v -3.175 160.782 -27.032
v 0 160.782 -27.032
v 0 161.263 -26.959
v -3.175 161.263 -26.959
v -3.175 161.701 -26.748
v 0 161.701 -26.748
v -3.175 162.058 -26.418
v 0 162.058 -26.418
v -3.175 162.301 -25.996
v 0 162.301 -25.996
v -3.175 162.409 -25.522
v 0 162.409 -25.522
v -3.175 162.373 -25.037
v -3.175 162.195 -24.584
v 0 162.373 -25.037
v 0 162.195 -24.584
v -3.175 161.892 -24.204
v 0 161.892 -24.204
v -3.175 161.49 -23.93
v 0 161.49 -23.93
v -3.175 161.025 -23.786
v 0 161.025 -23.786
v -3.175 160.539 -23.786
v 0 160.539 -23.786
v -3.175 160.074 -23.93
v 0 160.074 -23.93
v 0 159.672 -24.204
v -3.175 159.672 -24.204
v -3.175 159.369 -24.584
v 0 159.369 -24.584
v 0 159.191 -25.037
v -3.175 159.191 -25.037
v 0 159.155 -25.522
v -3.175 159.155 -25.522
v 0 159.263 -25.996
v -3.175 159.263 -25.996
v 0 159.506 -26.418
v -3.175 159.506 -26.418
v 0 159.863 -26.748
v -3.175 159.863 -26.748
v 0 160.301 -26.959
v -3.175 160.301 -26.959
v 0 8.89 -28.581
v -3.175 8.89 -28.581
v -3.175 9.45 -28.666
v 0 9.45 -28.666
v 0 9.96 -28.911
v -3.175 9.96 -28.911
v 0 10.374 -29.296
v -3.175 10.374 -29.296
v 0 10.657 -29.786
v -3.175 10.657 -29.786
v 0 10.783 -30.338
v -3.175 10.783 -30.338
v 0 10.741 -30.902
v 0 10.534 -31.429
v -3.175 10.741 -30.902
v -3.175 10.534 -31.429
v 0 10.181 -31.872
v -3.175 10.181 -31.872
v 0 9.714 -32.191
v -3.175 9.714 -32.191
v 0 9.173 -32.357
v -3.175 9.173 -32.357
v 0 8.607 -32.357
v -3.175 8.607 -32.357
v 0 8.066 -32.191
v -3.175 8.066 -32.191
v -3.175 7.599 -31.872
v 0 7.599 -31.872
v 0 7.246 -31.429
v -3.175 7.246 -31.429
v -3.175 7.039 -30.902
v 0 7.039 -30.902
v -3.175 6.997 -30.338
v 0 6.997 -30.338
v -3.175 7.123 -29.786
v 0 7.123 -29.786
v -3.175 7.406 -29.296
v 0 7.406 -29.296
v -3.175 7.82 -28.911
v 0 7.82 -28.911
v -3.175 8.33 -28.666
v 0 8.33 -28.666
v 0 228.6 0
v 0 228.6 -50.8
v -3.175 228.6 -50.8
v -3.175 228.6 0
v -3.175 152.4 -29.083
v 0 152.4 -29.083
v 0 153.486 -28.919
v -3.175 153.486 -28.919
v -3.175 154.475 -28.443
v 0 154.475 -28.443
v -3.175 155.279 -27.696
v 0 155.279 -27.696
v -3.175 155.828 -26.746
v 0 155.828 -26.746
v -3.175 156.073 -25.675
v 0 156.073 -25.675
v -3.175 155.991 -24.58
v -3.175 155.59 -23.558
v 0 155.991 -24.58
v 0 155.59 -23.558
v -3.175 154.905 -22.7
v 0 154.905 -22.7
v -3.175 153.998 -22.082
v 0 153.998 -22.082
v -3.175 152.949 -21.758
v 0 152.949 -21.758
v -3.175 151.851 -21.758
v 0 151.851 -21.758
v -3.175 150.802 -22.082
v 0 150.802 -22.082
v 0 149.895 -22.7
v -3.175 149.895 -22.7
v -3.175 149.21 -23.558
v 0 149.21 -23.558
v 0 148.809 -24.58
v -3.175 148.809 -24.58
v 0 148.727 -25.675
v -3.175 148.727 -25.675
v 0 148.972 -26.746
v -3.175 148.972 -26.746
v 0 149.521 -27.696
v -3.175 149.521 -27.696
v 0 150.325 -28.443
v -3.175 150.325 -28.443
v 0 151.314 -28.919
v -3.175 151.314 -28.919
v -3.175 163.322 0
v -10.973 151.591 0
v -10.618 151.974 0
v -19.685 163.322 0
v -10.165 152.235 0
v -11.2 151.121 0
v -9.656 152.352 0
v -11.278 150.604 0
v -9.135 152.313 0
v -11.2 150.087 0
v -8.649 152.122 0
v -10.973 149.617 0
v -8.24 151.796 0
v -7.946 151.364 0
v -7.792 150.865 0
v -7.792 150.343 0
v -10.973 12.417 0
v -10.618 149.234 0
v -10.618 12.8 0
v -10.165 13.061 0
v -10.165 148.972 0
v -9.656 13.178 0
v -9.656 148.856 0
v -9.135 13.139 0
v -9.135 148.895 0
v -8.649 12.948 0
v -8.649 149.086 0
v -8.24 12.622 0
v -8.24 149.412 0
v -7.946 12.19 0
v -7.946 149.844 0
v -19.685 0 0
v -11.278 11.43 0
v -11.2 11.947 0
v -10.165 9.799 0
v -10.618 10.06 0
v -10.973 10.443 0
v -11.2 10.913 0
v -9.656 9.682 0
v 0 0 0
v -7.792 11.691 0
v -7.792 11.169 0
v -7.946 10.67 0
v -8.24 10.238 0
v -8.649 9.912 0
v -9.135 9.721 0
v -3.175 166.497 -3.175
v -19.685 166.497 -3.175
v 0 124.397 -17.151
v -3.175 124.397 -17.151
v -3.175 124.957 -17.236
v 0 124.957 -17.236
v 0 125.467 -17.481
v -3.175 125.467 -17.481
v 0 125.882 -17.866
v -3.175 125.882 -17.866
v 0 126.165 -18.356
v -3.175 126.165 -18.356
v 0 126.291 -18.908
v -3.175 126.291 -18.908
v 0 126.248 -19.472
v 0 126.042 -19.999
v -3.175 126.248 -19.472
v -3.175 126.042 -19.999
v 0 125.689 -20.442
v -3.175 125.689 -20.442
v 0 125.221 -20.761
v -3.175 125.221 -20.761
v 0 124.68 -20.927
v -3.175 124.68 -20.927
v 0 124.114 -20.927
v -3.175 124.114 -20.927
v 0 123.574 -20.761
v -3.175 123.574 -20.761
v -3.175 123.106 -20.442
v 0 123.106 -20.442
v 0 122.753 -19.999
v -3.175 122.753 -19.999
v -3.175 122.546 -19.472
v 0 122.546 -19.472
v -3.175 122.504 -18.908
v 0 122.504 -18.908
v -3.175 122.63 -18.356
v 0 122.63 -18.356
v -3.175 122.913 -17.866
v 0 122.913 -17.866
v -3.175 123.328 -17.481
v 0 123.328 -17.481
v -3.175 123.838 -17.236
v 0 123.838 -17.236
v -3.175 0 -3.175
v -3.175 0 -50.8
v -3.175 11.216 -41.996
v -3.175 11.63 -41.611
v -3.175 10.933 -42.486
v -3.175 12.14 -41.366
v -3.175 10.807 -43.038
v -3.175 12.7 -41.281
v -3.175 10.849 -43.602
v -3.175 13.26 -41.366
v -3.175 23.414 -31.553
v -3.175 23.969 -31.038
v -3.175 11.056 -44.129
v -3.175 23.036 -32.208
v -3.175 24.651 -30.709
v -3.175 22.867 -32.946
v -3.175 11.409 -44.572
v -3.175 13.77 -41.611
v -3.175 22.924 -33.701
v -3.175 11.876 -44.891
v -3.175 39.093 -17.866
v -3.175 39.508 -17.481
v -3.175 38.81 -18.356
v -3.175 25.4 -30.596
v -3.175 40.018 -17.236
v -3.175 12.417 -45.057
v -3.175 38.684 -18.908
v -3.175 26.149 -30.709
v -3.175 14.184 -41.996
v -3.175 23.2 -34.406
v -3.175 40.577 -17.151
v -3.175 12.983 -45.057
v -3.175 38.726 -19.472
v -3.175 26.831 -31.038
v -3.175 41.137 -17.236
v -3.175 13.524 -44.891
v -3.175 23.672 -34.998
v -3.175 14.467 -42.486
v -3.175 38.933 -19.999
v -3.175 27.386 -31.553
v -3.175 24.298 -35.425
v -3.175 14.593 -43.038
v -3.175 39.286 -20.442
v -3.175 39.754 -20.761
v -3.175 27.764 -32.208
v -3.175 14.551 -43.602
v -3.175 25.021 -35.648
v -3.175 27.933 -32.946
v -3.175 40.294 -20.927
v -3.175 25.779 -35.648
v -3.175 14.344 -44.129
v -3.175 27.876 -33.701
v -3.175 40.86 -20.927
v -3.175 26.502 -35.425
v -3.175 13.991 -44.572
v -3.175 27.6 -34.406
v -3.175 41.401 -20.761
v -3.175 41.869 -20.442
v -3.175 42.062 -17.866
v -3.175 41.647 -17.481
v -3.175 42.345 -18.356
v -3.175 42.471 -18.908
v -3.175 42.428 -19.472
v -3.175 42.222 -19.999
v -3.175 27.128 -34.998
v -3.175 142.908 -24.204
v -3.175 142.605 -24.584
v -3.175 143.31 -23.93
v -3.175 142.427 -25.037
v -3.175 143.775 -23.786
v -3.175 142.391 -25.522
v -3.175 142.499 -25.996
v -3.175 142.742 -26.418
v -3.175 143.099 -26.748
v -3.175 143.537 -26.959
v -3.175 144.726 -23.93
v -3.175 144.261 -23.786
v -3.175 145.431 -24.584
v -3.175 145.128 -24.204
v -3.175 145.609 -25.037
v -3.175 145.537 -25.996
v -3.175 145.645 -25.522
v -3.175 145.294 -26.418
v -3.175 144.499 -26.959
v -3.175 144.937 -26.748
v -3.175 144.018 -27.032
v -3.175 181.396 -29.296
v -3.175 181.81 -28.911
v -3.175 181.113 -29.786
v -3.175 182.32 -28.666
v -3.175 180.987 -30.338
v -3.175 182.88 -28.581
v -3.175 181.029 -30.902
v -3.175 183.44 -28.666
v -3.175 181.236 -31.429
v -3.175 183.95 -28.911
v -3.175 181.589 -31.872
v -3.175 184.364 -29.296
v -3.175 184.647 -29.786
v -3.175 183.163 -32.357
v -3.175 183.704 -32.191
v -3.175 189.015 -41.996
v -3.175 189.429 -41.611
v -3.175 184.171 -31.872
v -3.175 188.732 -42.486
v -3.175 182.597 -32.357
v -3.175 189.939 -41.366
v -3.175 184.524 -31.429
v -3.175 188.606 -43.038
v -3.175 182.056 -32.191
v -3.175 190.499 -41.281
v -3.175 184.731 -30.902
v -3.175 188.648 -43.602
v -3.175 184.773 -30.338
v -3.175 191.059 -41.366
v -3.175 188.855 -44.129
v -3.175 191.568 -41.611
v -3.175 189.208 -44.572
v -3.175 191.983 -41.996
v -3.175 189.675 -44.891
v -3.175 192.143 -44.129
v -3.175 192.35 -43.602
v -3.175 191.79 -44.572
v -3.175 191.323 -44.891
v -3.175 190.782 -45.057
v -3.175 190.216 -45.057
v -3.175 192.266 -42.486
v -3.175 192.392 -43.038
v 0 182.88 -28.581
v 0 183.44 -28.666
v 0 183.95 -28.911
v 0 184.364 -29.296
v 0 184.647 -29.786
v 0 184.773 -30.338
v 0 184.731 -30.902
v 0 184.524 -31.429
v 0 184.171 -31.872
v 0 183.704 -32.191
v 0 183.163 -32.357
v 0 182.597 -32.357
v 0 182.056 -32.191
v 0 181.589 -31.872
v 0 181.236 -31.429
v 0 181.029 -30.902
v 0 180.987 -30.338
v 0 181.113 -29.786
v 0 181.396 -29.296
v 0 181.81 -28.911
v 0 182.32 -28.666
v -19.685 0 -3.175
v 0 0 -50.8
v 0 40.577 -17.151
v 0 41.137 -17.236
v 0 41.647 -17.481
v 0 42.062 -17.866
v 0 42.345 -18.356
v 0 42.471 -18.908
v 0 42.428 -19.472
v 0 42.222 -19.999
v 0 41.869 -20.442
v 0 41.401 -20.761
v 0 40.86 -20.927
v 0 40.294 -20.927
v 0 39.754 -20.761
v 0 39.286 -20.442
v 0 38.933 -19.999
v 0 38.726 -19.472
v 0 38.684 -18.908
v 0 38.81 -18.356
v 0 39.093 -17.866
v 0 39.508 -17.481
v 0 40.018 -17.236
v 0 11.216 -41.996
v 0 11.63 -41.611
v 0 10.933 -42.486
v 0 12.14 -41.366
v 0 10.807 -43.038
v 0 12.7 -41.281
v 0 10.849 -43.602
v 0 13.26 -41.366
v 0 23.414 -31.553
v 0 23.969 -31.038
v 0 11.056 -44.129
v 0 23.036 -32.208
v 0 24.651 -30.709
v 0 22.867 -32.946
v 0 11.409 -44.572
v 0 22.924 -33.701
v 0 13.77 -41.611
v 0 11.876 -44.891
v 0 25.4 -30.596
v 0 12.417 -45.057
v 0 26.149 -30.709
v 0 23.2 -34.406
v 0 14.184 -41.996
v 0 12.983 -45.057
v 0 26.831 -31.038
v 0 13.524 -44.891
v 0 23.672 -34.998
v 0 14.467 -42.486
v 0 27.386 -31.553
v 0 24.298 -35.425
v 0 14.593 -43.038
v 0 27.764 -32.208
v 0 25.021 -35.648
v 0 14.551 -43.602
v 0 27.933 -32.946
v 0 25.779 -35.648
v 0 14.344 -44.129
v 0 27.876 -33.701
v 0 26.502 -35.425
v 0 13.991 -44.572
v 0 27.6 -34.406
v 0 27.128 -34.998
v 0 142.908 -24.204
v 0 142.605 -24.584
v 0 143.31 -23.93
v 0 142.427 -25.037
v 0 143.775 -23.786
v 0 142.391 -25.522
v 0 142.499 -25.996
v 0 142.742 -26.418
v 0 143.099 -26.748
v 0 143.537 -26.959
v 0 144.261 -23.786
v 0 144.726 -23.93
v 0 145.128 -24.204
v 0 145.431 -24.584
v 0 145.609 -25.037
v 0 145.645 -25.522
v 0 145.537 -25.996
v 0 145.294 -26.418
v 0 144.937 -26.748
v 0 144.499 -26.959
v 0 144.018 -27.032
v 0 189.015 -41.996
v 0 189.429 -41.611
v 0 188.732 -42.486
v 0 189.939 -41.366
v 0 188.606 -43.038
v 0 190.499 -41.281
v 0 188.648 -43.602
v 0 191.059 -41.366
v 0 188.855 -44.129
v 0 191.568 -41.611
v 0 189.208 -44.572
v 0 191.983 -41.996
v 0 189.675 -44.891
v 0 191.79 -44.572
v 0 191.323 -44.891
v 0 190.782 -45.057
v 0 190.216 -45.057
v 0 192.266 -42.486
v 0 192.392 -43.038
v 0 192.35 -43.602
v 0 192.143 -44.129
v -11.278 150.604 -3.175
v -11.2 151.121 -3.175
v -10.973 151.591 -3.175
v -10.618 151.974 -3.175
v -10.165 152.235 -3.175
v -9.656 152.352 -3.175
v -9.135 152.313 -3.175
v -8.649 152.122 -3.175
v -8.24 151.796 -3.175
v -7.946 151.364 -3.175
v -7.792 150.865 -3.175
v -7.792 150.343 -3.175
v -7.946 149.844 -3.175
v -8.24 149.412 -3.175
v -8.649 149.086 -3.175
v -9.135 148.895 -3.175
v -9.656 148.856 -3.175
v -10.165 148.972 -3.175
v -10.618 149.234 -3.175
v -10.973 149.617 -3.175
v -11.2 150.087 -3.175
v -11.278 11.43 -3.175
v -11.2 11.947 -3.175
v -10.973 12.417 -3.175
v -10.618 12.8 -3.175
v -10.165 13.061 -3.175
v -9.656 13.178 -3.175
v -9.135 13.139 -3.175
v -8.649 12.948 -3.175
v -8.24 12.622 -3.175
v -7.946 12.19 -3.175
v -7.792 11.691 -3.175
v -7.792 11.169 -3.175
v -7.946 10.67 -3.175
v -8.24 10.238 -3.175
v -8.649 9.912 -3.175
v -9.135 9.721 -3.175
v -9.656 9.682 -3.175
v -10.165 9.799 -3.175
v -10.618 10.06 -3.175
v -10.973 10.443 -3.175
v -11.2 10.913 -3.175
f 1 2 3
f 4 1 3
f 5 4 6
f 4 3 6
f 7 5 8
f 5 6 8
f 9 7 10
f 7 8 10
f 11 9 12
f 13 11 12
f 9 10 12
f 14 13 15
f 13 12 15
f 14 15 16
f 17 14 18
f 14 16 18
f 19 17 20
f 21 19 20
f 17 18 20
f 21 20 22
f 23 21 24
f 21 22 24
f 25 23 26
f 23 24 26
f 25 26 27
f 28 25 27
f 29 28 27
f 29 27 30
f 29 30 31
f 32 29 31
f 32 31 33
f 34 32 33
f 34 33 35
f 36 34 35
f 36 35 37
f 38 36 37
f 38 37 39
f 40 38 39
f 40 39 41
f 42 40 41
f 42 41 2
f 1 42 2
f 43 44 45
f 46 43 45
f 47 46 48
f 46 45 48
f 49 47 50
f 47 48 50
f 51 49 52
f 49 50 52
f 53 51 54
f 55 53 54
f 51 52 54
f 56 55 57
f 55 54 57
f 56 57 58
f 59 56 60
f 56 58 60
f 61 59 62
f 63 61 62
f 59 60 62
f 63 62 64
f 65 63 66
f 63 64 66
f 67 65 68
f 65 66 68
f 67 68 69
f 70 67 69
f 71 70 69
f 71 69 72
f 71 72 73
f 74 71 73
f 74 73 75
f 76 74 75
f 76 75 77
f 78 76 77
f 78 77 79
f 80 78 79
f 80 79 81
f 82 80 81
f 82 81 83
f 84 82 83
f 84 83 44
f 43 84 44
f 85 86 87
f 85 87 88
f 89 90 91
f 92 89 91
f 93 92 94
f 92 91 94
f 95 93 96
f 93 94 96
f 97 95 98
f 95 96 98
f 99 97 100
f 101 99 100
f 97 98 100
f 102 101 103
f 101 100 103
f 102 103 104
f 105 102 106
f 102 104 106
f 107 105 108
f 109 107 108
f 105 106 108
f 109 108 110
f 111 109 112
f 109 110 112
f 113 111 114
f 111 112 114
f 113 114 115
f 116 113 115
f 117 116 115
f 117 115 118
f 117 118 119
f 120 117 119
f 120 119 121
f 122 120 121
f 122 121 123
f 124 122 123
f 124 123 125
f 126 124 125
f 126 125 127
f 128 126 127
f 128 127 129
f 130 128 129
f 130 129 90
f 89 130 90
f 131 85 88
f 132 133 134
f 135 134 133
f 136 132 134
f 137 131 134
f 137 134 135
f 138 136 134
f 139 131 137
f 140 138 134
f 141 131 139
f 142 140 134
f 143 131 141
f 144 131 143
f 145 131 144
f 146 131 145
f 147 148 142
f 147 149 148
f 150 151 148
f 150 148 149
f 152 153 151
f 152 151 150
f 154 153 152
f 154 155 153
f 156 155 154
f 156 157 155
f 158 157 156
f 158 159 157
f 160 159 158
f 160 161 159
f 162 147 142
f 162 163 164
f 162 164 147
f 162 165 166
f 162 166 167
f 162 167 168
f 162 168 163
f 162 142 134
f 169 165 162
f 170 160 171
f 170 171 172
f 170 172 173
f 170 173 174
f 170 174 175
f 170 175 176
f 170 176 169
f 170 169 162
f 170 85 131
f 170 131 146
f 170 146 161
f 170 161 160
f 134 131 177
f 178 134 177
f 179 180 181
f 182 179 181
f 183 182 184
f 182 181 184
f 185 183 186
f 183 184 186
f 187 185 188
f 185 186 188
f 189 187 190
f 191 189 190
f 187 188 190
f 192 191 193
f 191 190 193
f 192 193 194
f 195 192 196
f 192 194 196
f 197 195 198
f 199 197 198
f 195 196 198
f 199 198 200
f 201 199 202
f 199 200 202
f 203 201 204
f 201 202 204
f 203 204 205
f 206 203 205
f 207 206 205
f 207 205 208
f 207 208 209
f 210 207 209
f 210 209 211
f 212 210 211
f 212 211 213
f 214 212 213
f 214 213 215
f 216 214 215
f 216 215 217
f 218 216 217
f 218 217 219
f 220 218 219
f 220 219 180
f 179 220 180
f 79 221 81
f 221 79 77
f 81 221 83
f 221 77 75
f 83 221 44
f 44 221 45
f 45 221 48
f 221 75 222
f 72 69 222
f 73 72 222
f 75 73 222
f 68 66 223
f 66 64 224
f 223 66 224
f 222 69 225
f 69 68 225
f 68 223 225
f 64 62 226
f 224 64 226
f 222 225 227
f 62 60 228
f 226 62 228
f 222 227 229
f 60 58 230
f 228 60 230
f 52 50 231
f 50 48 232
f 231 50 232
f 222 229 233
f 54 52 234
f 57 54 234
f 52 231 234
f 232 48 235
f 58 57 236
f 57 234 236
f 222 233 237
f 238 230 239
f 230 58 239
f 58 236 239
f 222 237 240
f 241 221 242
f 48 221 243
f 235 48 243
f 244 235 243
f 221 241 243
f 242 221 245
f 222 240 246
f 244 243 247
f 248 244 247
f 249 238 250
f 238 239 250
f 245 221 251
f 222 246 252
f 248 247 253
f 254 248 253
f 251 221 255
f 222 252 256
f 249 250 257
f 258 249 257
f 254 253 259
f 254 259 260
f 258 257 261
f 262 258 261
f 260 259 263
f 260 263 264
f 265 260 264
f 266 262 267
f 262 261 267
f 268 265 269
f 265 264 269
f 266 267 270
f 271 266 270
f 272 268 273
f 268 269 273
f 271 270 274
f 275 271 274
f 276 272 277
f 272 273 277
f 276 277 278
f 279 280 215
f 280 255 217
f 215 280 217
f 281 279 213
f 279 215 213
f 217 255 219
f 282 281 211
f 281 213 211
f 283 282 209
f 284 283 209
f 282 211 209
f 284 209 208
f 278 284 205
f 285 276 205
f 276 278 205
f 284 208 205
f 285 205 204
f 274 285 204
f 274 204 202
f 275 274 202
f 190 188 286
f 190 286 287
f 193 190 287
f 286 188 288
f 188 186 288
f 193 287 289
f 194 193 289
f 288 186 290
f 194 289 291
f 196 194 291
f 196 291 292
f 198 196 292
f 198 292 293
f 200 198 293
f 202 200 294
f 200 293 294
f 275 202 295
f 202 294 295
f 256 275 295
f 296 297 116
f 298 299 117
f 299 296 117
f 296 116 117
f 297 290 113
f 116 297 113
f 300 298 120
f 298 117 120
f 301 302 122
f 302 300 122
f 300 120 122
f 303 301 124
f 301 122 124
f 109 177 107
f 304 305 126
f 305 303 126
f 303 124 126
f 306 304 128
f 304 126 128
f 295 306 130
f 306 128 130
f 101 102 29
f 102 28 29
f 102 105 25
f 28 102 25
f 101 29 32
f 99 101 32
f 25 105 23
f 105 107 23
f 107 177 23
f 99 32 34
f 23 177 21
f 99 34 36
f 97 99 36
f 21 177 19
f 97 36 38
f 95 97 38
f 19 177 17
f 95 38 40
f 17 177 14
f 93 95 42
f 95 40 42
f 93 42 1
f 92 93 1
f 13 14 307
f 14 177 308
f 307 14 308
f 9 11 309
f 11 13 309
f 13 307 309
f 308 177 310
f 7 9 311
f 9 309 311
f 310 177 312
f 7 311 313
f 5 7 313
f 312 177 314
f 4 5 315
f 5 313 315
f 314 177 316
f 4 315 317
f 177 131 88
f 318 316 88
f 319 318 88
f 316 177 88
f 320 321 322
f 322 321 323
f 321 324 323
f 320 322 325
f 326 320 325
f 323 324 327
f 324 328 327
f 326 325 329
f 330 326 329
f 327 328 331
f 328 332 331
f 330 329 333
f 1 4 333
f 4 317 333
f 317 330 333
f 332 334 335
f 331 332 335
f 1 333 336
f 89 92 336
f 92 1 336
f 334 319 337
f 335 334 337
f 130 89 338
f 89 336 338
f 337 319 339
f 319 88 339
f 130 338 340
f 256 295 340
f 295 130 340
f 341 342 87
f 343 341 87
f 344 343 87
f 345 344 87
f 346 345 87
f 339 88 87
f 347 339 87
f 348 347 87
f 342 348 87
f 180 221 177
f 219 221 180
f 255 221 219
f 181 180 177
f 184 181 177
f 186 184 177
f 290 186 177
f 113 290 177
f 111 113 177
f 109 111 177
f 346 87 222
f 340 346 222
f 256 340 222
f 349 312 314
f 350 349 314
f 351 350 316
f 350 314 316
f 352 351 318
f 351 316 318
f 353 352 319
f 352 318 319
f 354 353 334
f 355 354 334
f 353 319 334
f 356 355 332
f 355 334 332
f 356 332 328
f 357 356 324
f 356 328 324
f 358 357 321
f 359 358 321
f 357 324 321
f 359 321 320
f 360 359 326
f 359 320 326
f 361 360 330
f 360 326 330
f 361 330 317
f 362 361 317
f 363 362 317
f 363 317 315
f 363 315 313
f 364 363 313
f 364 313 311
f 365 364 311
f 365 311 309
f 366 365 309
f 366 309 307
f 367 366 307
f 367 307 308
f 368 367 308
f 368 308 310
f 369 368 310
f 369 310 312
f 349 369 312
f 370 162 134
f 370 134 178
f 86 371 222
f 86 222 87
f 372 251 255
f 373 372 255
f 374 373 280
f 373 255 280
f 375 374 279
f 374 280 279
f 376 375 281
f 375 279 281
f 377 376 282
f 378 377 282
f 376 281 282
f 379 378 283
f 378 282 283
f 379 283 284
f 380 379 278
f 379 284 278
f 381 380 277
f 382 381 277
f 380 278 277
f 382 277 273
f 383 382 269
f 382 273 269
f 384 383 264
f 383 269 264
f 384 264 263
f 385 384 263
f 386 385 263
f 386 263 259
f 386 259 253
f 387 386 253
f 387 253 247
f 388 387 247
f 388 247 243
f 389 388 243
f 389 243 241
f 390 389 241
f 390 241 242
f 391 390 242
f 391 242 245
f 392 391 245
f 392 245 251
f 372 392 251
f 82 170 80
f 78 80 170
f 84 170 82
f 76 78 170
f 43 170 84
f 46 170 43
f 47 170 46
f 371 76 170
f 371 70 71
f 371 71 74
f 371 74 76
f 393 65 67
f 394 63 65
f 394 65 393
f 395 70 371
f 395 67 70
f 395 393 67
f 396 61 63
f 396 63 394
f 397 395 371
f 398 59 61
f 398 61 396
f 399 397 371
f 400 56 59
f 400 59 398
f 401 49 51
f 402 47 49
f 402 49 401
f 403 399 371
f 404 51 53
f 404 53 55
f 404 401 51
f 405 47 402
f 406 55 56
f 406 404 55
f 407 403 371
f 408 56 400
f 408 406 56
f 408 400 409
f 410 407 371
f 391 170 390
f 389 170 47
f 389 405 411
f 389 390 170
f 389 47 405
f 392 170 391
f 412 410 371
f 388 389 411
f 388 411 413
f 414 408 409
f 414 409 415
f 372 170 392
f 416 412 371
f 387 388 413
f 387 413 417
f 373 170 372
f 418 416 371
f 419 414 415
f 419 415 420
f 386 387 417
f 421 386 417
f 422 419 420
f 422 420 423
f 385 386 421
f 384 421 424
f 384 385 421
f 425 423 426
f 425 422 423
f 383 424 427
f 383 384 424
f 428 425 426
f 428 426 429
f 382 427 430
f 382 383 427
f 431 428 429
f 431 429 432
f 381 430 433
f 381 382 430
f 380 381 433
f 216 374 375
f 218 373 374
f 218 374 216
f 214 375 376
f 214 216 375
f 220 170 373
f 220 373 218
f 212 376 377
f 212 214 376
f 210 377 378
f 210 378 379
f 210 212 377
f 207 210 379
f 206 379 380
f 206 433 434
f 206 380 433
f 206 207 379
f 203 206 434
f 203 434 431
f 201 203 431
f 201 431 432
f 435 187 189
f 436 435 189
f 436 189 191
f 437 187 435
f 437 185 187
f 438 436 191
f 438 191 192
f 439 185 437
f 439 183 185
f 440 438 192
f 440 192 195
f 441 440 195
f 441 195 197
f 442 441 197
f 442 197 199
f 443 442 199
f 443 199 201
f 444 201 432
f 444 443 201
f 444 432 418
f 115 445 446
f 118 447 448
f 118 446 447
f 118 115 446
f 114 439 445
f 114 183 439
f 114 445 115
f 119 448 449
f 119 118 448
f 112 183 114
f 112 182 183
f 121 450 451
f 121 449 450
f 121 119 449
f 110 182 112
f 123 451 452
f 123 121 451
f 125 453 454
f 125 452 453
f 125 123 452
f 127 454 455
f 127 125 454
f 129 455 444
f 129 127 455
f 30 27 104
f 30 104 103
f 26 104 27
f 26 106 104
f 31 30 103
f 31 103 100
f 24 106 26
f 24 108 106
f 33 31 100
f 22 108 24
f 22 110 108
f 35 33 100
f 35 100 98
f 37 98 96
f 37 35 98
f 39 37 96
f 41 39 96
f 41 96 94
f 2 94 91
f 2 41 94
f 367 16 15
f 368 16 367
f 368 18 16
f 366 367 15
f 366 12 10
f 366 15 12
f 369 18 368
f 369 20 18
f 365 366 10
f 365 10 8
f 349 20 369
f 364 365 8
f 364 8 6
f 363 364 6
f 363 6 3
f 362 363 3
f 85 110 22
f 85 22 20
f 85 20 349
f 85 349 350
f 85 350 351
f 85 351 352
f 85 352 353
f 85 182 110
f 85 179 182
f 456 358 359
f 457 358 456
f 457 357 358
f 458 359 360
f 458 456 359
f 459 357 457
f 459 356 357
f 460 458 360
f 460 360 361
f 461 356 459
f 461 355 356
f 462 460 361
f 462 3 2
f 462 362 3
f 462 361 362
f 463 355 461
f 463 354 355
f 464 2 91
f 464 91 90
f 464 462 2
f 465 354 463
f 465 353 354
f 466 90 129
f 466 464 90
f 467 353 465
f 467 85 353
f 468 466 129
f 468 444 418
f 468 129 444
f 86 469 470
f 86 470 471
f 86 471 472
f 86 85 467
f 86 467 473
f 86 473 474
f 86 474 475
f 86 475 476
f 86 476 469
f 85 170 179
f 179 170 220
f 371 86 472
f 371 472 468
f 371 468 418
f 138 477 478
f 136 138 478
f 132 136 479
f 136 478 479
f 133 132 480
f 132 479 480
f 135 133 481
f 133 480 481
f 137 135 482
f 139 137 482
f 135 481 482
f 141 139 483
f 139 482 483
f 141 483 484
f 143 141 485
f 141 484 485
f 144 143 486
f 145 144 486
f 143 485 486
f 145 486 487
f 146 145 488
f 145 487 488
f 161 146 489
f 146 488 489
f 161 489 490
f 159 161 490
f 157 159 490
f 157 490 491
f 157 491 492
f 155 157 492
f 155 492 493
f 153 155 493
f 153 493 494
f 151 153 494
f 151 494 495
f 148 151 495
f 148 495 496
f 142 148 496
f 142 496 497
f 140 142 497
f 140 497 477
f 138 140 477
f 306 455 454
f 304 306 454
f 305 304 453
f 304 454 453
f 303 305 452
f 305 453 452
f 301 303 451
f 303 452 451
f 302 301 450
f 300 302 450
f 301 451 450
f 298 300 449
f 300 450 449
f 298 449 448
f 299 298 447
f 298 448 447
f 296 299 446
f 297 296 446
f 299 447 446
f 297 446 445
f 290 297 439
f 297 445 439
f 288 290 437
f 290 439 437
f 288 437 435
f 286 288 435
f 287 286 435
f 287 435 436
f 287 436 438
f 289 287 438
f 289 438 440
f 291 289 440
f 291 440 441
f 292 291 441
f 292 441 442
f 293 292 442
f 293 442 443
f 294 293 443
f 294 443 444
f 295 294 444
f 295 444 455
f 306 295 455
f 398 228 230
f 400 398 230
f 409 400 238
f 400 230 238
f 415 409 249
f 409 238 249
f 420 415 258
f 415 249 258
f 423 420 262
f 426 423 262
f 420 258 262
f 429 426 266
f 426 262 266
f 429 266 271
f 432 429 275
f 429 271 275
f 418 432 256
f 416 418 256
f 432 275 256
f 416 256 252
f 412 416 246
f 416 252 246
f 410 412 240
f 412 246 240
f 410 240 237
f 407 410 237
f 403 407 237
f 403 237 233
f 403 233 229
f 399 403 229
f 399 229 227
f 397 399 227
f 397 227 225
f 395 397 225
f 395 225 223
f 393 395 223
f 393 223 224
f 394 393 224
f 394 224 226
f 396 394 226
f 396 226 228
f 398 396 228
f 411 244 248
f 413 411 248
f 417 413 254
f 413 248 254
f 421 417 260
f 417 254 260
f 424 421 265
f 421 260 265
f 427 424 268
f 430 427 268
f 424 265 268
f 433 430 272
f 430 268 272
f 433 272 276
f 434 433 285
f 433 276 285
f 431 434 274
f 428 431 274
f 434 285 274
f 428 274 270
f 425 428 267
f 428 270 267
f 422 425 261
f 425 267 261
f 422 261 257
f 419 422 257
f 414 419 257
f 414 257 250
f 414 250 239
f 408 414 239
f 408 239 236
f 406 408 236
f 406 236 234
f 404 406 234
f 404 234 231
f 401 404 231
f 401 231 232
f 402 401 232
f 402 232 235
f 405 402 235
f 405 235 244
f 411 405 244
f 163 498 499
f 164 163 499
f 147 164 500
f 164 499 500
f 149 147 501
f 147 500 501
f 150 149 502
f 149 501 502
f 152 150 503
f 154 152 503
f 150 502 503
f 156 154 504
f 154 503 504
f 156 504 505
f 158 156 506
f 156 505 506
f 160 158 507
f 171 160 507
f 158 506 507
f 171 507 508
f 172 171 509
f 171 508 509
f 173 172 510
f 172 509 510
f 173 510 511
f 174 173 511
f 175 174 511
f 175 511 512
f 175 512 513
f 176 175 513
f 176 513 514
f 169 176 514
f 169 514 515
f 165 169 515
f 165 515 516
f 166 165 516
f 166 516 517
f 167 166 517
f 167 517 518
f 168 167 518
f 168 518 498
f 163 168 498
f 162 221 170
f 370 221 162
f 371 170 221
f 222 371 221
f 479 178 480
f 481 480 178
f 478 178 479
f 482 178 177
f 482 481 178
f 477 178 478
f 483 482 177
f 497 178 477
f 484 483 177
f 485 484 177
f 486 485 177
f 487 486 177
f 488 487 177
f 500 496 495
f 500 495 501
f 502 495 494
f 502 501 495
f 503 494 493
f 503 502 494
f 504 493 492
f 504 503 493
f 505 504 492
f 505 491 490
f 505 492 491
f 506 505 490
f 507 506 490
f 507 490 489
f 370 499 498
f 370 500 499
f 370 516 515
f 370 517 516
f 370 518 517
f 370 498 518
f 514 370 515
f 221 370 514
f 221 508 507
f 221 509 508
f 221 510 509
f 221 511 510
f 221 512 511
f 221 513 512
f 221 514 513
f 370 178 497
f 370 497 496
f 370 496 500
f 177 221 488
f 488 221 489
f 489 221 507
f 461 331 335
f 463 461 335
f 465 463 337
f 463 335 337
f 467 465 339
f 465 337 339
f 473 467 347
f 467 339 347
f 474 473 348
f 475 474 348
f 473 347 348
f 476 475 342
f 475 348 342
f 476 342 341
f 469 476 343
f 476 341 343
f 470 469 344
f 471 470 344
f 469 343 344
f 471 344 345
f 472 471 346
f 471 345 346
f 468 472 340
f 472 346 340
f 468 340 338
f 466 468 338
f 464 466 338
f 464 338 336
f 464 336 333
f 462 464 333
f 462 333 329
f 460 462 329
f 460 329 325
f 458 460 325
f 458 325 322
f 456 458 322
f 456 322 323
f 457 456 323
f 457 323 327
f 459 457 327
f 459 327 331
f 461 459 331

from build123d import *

# Parameters (mm, degrees)
BOSS_EXTRUDE1_DEPTH     = 203.2
CUT_EXTRUDE3_DEPTH      = 17.51
CUT_EXTRUDE3_DEPTH_BACK = 4.175
SKETCH7_R               = 3.683
SKETCH7_R_2             = 1.63195
CUT_EXTRUDE4_DEPTH      = 20.685
SKETCH8_R               = 1.89865
CUT_EXTRUDE5_DEPTH      = 4.175
SKETCH9_R               = 1.89865
CUT_EXTRUDE6_DEPTH      = 4.175
SKETCH10_R              = 1.7526
CUT_EXTRUDE7_DEPTH      = 4.175
BOSS_EXTRUDE2_DEPTH     = 3.175
SKETCH12_R              = 2.54
CUT_EXTRUDE8_DEPTH      = 4.175
SKETCH13_R              = 1.89865
CUT_EXTRUDE9_DEPTH      = 4.175


with BuildPart() as part:
    # Sketch1 → Boss-Extrude1 (new body)
    with BuildSketch(Plane(origin=(0, 0, 0), x_dir=(1, 0, 0), z_dir=(0, 1, 0))):
        Polygon((0, 0), (-19.685, 0), (-19.685, 3.175), (-3.175, 3.175), (-3.175, 50.8), (0, 50.8), align=None)
    extrude(amount=BOSS_EXTRUDE1_DEPTH)

    # Sketch5 → Cut-Extrude3 (cut, two sides)
    with BuildSketch(Plane.ZY.offset(3.175)) as cut_extrude3_sk:
        Polygon((0, 163.322), (-50.8, 214.122), (-60.823247691, 214.122), (-60.823247691, 256.047203652), (33.196571846, 256.047203652), (33.196571846, 163.322), align=None)
    extrude(amount=CUT_EXTRUDE3_DEPTH, mode=Mode.SUBTRACT)
    extrude(cut_extrude3_sk.sketch, amount=-CUT_EXTRUDE3_DEPTH_BACK, mode=Mode.SUBTRACT)

    # Sketch7 → Cut-Extrude4 (cut, through all)
    with BuildSketch(Plane(origin=(0, 0, 0), x_dir=(0, 0, -1), z_dir=(1, 0, 0))):
        with Locations((25.4, 152.4)):
            Circle(SKETCH7_R)
        with Locations((25.4, 160.782)):
            Circle(SKETCH7_R_2)
        with Locations((25.4, 144.018)):
            Circle(SKETCH7_R_2)
    extrude(amount=-CUT_EXTRUDE4_DEPTH, mode=Mode.SUBTRACT)

    # Sketch8 → Cut-Extrude5 (cut, through all)
    with BuildSketch(Plane.ZY.offset(3.175)):
        with Locations((-30.48, 182.88)):
            Circle(SKETCH8_R)
        with Locations((-30.48, 8.89)):
            Circle(SKETCH8_R)
    extrude(amount=-CUT_EXTRUDE5_DEPTH, mode=Mode.SUBTRACT)

    # Sketch9 → Cut-Extrude6 (cut, through all)
    with BuildSketch(Plane.ZY.offset(3.175)):
        with Locations((-19.05, 40.577339992)):
            Circle(SKETCH9_R)
        with Locations((-19.05, 124.397339992)):
            Circle(SKETCH9_R)
    extrude(amount=-CUT_EXTRUDE6_DEPTH, mode=Mode.SUBTRACT)

    # Sketch10 → Cut-Extrude7 (cut, through all)
    with BuildSketch(Plane(origin=(0, 0, -3.175), x_dir=(-1, 0, 0), z_dir=(0, 0, -1))):
        with Locations((9.525, 11.43)):
            Circle(SKETCH10_R)
        with Locations((9.525, 150.603948776)):
            Circle(SKETCH10_R)
    extrude(amount=-CUT_EXTRUDE7_DEPTH, mode=Mode.SUBTRACT)

    # Sketch11 → Boss-Extrude2 (add)
    with BuildSketch(Plane(origin=(0, 0, 0), x_dir=(0, 0, -1), z_dir=(1, 0, 0))):
        Polygon((0, 228.6), (0, 163.322), (39.878, 203.2), (50.8, 203.2), (50.8, 228.6), align=None)
    extrude(amount=-BOSS_EXTRUDE2_DEPTH)

    # Sketch12 → Cut-Extrude8 (cut, through all)
    with BuildSketch(Plane.ZY.offset(3.175)):
        with Locations((-33.136196499, 25.4)):
            Circle(SKETCH12_R)
    extrude(amount=-CUT_EXTRUDE8_DEPTH, mode=Mode.SUBTRACT)

    # Sketch13 → Cut-Extrude9 (cut, through all)
    with BuildSketch(Plane.ZY.offset(3.175)):
        with Locations((-43.18, 12.7)):
            Circle(SKETCH13_R)
        with Locations((-43.18, 190.498941664)):
            Circle(SKETCH13_R)
    extrude(amount=-CUT_EXTRUDE9_DEPTH, mode=Mode.SUBTRACT)


solid = part.part
